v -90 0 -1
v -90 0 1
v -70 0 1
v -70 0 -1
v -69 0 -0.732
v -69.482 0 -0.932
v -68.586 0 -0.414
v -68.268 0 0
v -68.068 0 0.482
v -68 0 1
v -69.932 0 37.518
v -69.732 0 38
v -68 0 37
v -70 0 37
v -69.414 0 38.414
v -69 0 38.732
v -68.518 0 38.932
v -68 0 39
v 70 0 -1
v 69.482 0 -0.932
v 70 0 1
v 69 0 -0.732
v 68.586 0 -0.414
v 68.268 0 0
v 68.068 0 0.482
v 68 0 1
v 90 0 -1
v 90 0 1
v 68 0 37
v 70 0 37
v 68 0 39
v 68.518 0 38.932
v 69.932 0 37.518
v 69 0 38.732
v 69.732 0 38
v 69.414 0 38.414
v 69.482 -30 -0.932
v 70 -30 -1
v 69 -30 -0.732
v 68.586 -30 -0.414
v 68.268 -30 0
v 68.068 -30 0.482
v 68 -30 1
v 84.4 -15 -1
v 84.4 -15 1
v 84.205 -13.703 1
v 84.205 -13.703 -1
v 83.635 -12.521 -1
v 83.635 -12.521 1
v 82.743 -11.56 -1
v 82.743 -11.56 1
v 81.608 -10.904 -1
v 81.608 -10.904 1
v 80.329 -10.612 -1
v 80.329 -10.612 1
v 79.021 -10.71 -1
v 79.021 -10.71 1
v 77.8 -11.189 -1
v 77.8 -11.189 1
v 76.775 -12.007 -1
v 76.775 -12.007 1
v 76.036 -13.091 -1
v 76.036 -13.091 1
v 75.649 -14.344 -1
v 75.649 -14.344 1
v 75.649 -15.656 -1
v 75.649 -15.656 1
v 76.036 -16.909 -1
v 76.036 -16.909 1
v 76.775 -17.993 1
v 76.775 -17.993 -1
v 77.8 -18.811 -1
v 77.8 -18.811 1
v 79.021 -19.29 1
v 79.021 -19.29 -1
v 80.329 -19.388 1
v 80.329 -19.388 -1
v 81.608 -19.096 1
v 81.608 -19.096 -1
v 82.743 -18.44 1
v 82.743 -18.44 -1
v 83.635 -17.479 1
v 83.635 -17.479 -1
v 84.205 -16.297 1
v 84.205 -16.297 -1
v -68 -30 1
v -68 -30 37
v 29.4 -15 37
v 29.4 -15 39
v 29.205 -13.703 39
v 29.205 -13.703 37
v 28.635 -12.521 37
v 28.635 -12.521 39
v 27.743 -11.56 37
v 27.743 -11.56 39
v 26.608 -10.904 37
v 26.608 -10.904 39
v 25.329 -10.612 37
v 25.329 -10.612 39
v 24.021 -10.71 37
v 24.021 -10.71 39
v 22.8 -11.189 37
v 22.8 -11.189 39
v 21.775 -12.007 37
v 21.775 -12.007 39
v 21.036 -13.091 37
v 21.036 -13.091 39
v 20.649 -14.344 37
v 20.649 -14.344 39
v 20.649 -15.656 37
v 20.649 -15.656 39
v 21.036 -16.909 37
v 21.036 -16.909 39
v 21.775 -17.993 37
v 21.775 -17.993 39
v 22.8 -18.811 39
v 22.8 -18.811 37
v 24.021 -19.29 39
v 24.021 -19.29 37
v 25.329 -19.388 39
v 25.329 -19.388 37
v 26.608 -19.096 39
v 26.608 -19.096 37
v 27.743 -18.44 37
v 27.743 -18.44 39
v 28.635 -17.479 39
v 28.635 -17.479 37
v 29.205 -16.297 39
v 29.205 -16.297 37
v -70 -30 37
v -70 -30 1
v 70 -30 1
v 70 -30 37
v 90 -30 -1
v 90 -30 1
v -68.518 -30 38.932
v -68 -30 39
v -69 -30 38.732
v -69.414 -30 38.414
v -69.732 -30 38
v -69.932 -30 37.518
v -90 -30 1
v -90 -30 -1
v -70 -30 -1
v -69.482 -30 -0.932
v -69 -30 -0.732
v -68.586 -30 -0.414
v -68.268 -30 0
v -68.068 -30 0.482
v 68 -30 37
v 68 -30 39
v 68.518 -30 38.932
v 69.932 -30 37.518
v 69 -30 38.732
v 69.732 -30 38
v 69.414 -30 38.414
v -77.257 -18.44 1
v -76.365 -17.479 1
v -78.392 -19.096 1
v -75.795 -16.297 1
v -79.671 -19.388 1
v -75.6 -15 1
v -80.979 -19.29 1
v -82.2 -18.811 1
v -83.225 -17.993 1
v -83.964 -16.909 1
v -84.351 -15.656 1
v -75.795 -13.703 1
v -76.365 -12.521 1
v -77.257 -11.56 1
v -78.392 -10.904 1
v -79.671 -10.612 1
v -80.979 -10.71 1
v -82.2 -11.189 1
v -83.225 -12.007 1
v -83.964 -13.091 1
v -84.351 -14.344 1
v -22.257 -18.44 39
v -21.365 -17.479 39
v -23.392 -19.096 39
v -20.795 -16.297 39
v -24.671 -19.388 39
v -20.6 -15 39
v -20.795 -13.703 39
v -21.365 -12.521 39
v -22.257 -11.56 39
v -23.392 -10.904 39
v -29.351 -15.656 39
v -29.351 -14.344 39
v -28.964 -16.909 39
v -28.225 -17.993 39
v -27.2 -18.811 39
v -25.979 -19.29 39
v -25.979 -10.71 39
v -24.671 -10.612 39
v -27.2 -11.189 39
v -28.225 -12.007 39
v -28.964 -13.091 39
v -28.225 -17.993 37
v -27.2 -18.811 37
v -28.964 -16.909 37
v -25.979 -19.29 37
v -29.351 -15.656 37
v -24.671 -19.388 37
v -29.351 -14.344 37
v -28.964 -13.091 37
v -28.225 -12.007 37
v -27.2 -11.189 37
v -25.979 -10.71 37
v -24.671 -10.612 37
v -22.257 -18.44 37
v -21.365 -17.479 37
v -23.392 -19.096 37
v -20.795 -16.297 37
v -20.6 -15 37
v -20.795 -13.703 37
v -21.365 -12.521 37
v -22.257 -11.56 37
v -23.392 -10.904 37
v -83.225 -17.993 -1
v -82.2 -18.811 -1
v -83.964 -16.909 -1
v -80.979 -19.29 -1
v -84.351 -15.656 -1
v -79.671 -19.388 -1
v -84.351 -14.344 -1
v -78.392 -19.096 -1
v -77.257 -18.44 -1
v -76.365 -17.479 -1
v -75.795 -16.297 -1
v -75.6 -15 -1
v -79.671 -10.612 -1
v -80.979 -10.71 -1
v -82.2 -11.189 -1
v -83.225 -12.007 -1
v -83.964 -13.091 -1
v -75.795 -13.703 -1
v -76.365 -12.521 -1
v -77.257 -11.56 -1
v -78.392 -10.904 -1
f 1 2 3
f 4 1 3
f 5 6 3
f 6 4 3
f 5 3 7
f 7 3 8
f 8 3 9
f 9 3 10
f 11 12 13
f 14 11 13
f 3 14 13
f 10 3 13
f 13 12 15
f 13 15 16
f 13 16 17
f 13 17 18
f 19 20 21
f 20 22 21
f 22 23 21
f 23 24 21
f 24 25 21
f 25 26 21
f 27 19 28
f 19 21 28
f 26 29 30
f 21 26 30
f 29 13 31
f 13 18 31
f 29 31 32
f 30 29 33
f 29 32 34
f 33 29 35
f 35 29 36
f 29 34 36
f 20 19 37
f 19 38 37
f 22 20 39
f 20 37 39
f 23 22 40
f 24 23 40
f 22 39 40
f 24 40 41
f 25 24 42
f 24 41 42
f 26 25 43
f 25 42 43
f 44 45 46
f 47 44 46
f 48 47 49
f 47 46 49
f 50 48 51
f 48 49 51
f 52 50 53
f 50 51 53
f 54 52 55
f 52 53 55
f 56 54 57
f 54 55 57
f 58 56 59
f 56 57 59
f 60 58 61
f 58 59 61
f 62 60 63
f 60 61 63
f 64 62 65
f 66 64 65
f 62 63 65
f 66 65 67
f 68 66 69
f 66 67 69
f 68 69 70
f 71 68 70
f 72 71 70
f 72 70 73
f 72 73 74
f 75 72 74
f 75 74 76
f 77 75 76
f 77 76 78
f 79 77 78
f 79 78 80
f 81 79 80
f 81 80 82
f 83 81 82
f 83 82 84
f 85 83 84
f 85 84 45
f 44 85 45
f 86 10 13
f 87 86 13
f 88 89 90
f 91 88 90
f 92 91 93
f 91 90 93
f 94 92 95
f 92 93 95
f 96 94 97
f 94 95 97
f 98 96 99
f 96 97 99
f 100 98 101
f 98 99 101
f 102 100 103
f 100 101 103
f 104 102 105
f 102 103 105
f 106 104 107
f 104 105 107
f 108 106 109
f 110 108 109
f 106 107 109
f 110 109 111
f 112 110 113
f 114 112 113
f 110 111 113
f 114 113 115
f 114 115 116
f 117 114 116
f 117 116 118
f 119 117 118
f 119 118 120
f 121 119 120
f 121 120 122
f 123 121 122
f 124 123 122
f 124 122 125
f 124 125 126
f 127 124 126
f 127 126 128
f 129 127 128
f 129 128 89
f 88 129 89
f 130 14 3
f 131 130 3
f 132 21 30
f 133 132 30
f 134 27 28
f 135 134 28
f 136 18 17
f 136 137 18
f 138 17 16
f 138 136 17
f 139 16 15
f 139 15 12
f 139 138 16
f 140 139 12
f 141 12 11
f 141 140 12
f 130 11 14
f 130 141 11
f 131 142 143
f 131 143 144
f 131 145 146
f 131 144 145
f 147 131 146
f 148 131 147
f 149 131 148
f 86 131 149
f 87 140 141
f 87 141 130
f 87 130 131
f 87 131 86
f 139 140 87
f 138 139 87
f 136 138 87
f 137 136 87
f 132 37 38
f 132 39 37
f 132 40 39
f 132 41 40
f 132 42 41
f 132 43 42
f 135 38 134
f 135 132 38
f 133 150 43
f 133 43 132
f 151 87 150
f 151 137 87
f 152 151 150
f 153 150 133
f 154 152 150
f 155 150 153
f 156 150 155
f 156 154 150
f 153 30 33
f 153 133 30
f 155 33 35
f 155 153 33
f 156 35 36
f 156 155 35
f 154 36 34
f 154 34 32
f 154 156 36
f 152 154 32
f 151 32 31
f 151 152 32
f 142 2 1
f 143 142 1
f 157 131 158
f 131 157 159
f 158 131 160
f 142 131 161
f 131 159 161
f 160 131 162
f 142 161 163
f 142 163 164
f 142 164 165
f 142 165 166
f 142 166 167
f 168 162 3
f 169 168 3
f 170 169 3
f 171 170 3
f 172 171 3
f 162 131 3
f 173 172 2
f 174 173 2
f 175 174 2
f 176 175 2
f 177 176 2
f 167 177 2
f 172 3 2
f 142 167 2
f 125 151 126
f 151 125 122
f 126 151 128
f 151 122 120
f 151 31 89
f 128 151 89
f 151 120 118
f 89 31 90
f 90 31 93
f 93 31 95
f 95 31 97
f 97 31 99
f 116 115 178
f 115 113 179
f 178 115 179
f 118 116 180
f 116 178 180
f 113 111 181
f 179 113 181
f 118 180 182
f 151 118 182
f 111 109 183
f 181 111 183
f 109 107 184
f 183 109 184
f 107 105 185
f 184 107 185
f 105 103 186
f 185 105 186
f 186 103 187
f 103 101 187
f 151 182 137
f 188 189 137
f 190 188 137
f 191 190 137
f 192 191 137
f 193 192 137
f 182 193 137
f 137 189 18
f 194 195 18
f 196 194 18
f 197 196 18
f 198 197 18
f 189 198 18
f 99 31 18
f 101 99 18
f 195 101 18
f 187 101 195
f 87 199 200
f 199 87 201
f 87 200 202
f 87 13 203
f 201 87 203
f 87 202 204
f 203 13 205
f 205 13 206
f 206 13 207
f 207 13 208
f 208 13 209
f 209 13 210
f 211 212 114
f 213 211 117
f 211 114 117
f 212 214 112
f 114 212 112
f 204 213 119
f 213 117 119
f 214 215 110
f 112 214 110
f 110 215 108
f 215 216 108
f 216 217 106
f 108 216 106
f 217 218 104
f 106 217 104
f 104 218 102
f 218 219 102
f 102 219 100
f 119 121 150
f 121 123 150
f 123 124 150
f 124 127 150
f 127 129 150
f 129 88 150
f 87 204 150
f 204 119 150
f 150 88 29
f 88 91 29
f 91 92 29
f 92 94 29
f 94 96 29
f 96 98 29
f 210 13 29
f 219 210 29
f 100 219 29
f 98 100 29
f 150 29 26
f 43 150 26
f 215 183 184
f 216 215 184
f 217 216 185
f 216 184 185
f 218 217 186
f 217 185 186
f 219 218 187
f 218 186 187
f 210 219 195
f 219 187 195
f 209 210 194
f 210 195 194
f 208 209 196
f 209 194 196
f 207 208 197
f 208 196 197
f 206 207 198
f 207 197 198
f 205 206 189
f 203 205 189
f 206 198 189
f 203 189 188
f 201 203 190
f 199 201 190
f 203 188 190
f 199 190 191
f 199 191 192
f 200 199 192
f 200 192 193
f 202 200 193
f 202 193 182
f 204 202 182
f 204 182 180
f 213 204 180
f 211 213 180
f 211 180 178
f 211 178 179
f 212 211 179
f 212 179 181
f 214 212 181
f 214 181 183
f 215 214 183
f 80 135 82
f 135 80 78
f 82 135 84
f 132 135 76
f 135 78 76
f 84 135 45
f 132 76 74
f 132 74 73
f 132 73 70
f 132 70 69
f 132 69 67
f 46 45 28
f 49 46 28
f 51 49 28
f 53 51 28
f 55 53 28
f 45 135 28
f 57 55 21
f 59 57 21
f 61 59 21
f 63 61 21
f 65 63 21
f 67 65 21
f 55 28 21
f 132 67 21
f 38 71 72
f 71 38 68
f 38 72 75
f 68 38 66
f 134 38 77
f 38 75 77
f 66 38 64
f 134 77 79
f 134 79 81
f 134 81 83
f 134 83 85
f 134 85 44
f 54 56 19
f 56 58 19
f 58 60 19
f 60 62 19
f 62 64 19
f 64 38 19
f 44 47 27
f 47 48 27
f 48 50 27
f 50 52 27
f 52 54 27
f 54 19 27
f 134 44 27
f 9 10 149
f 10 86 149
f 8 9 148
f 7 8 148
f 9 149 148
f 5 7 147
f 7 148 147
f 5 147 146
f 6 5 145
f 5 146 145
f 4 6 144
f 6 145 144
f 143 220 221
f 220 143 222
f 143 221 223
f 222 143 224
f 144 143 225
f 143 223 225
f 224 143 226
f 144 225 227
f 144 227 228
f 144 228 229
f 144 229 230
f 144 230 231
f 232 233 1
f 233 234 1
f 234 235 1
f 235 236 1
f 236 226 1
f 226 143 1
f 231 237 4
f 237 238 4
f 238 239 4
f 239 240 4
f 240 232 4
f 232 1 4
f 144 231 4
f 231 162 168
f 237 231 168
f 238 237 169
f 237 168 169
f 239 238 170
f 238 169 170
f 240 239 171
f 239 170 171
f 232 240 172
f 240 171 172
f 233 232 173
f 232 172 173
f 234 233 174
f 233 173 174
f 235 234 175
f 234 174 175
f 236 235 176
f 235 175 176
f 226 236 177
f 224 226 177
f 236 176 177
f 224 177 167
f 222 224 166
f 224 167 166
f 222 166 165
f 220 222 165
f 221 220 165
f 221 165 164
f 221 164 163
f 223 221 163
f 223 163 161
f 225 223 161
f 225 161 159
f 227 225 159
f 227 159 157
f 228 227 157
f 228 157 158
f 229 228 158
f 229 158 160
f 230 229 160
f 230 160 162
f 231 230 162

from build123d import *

# Parameters (mm, degrees)
F1_DEPTH = 30
F2_R     = 4.4
F3_R     = 4.4
F4_DEPTH = 25
F5_R     = 2
F6_R     = 2


# Not quite as in the source:
# - a feature names something its author has since deleted; it is built from what else it names


with BuildPart() as f1:
    # F0 (on Front) → F1 (new body)
    with BuildSketch(Plane.XZ):
        Polygon((90, -1), (90, 1), (70, 1), (70, 39), (-70, 39), (-70, 1), (-90, 1), (-90, -1), (-68, -1), (-68, 37), (68, 37), (68, -1), align=None)
    extrude(amount=F1_DEPTH)

    # F2 (on face) + F3 (on face) → F4 (cut)
    with BuildSketch(Plane.XY.offset(1)):
        with Locations((-80, -15)):
            Circle(F2_R)
        with Locations((80, -15)):
            Circle(F2_R)
    with BuildSketch(Plane.XY.offset(39)):
        with Locations((-25, -15)):
            Circle(F3_R)
        with Locations((25, -15)):
            Circle(F3_R)
    extrude(amount=-F4_DEPTH, mode=Mode.SUBTRACT)

    # F5
    f5_edges = [f1.edges().sort_by_distance(p)[0] for p in [
        (-70, -15, 39),
        (70, -15, 39),
    ]]
    fillet(f5_edges, radius=F5_R)

    # F6
    f6_edges = [f1.edges().sort_by_distance(p)[0] for p in [
        (68, -15, -1),
        (-68, -15, -1),
    ]]
    fillet(f6_edges, radius=F6_R)


solid = f1.part
